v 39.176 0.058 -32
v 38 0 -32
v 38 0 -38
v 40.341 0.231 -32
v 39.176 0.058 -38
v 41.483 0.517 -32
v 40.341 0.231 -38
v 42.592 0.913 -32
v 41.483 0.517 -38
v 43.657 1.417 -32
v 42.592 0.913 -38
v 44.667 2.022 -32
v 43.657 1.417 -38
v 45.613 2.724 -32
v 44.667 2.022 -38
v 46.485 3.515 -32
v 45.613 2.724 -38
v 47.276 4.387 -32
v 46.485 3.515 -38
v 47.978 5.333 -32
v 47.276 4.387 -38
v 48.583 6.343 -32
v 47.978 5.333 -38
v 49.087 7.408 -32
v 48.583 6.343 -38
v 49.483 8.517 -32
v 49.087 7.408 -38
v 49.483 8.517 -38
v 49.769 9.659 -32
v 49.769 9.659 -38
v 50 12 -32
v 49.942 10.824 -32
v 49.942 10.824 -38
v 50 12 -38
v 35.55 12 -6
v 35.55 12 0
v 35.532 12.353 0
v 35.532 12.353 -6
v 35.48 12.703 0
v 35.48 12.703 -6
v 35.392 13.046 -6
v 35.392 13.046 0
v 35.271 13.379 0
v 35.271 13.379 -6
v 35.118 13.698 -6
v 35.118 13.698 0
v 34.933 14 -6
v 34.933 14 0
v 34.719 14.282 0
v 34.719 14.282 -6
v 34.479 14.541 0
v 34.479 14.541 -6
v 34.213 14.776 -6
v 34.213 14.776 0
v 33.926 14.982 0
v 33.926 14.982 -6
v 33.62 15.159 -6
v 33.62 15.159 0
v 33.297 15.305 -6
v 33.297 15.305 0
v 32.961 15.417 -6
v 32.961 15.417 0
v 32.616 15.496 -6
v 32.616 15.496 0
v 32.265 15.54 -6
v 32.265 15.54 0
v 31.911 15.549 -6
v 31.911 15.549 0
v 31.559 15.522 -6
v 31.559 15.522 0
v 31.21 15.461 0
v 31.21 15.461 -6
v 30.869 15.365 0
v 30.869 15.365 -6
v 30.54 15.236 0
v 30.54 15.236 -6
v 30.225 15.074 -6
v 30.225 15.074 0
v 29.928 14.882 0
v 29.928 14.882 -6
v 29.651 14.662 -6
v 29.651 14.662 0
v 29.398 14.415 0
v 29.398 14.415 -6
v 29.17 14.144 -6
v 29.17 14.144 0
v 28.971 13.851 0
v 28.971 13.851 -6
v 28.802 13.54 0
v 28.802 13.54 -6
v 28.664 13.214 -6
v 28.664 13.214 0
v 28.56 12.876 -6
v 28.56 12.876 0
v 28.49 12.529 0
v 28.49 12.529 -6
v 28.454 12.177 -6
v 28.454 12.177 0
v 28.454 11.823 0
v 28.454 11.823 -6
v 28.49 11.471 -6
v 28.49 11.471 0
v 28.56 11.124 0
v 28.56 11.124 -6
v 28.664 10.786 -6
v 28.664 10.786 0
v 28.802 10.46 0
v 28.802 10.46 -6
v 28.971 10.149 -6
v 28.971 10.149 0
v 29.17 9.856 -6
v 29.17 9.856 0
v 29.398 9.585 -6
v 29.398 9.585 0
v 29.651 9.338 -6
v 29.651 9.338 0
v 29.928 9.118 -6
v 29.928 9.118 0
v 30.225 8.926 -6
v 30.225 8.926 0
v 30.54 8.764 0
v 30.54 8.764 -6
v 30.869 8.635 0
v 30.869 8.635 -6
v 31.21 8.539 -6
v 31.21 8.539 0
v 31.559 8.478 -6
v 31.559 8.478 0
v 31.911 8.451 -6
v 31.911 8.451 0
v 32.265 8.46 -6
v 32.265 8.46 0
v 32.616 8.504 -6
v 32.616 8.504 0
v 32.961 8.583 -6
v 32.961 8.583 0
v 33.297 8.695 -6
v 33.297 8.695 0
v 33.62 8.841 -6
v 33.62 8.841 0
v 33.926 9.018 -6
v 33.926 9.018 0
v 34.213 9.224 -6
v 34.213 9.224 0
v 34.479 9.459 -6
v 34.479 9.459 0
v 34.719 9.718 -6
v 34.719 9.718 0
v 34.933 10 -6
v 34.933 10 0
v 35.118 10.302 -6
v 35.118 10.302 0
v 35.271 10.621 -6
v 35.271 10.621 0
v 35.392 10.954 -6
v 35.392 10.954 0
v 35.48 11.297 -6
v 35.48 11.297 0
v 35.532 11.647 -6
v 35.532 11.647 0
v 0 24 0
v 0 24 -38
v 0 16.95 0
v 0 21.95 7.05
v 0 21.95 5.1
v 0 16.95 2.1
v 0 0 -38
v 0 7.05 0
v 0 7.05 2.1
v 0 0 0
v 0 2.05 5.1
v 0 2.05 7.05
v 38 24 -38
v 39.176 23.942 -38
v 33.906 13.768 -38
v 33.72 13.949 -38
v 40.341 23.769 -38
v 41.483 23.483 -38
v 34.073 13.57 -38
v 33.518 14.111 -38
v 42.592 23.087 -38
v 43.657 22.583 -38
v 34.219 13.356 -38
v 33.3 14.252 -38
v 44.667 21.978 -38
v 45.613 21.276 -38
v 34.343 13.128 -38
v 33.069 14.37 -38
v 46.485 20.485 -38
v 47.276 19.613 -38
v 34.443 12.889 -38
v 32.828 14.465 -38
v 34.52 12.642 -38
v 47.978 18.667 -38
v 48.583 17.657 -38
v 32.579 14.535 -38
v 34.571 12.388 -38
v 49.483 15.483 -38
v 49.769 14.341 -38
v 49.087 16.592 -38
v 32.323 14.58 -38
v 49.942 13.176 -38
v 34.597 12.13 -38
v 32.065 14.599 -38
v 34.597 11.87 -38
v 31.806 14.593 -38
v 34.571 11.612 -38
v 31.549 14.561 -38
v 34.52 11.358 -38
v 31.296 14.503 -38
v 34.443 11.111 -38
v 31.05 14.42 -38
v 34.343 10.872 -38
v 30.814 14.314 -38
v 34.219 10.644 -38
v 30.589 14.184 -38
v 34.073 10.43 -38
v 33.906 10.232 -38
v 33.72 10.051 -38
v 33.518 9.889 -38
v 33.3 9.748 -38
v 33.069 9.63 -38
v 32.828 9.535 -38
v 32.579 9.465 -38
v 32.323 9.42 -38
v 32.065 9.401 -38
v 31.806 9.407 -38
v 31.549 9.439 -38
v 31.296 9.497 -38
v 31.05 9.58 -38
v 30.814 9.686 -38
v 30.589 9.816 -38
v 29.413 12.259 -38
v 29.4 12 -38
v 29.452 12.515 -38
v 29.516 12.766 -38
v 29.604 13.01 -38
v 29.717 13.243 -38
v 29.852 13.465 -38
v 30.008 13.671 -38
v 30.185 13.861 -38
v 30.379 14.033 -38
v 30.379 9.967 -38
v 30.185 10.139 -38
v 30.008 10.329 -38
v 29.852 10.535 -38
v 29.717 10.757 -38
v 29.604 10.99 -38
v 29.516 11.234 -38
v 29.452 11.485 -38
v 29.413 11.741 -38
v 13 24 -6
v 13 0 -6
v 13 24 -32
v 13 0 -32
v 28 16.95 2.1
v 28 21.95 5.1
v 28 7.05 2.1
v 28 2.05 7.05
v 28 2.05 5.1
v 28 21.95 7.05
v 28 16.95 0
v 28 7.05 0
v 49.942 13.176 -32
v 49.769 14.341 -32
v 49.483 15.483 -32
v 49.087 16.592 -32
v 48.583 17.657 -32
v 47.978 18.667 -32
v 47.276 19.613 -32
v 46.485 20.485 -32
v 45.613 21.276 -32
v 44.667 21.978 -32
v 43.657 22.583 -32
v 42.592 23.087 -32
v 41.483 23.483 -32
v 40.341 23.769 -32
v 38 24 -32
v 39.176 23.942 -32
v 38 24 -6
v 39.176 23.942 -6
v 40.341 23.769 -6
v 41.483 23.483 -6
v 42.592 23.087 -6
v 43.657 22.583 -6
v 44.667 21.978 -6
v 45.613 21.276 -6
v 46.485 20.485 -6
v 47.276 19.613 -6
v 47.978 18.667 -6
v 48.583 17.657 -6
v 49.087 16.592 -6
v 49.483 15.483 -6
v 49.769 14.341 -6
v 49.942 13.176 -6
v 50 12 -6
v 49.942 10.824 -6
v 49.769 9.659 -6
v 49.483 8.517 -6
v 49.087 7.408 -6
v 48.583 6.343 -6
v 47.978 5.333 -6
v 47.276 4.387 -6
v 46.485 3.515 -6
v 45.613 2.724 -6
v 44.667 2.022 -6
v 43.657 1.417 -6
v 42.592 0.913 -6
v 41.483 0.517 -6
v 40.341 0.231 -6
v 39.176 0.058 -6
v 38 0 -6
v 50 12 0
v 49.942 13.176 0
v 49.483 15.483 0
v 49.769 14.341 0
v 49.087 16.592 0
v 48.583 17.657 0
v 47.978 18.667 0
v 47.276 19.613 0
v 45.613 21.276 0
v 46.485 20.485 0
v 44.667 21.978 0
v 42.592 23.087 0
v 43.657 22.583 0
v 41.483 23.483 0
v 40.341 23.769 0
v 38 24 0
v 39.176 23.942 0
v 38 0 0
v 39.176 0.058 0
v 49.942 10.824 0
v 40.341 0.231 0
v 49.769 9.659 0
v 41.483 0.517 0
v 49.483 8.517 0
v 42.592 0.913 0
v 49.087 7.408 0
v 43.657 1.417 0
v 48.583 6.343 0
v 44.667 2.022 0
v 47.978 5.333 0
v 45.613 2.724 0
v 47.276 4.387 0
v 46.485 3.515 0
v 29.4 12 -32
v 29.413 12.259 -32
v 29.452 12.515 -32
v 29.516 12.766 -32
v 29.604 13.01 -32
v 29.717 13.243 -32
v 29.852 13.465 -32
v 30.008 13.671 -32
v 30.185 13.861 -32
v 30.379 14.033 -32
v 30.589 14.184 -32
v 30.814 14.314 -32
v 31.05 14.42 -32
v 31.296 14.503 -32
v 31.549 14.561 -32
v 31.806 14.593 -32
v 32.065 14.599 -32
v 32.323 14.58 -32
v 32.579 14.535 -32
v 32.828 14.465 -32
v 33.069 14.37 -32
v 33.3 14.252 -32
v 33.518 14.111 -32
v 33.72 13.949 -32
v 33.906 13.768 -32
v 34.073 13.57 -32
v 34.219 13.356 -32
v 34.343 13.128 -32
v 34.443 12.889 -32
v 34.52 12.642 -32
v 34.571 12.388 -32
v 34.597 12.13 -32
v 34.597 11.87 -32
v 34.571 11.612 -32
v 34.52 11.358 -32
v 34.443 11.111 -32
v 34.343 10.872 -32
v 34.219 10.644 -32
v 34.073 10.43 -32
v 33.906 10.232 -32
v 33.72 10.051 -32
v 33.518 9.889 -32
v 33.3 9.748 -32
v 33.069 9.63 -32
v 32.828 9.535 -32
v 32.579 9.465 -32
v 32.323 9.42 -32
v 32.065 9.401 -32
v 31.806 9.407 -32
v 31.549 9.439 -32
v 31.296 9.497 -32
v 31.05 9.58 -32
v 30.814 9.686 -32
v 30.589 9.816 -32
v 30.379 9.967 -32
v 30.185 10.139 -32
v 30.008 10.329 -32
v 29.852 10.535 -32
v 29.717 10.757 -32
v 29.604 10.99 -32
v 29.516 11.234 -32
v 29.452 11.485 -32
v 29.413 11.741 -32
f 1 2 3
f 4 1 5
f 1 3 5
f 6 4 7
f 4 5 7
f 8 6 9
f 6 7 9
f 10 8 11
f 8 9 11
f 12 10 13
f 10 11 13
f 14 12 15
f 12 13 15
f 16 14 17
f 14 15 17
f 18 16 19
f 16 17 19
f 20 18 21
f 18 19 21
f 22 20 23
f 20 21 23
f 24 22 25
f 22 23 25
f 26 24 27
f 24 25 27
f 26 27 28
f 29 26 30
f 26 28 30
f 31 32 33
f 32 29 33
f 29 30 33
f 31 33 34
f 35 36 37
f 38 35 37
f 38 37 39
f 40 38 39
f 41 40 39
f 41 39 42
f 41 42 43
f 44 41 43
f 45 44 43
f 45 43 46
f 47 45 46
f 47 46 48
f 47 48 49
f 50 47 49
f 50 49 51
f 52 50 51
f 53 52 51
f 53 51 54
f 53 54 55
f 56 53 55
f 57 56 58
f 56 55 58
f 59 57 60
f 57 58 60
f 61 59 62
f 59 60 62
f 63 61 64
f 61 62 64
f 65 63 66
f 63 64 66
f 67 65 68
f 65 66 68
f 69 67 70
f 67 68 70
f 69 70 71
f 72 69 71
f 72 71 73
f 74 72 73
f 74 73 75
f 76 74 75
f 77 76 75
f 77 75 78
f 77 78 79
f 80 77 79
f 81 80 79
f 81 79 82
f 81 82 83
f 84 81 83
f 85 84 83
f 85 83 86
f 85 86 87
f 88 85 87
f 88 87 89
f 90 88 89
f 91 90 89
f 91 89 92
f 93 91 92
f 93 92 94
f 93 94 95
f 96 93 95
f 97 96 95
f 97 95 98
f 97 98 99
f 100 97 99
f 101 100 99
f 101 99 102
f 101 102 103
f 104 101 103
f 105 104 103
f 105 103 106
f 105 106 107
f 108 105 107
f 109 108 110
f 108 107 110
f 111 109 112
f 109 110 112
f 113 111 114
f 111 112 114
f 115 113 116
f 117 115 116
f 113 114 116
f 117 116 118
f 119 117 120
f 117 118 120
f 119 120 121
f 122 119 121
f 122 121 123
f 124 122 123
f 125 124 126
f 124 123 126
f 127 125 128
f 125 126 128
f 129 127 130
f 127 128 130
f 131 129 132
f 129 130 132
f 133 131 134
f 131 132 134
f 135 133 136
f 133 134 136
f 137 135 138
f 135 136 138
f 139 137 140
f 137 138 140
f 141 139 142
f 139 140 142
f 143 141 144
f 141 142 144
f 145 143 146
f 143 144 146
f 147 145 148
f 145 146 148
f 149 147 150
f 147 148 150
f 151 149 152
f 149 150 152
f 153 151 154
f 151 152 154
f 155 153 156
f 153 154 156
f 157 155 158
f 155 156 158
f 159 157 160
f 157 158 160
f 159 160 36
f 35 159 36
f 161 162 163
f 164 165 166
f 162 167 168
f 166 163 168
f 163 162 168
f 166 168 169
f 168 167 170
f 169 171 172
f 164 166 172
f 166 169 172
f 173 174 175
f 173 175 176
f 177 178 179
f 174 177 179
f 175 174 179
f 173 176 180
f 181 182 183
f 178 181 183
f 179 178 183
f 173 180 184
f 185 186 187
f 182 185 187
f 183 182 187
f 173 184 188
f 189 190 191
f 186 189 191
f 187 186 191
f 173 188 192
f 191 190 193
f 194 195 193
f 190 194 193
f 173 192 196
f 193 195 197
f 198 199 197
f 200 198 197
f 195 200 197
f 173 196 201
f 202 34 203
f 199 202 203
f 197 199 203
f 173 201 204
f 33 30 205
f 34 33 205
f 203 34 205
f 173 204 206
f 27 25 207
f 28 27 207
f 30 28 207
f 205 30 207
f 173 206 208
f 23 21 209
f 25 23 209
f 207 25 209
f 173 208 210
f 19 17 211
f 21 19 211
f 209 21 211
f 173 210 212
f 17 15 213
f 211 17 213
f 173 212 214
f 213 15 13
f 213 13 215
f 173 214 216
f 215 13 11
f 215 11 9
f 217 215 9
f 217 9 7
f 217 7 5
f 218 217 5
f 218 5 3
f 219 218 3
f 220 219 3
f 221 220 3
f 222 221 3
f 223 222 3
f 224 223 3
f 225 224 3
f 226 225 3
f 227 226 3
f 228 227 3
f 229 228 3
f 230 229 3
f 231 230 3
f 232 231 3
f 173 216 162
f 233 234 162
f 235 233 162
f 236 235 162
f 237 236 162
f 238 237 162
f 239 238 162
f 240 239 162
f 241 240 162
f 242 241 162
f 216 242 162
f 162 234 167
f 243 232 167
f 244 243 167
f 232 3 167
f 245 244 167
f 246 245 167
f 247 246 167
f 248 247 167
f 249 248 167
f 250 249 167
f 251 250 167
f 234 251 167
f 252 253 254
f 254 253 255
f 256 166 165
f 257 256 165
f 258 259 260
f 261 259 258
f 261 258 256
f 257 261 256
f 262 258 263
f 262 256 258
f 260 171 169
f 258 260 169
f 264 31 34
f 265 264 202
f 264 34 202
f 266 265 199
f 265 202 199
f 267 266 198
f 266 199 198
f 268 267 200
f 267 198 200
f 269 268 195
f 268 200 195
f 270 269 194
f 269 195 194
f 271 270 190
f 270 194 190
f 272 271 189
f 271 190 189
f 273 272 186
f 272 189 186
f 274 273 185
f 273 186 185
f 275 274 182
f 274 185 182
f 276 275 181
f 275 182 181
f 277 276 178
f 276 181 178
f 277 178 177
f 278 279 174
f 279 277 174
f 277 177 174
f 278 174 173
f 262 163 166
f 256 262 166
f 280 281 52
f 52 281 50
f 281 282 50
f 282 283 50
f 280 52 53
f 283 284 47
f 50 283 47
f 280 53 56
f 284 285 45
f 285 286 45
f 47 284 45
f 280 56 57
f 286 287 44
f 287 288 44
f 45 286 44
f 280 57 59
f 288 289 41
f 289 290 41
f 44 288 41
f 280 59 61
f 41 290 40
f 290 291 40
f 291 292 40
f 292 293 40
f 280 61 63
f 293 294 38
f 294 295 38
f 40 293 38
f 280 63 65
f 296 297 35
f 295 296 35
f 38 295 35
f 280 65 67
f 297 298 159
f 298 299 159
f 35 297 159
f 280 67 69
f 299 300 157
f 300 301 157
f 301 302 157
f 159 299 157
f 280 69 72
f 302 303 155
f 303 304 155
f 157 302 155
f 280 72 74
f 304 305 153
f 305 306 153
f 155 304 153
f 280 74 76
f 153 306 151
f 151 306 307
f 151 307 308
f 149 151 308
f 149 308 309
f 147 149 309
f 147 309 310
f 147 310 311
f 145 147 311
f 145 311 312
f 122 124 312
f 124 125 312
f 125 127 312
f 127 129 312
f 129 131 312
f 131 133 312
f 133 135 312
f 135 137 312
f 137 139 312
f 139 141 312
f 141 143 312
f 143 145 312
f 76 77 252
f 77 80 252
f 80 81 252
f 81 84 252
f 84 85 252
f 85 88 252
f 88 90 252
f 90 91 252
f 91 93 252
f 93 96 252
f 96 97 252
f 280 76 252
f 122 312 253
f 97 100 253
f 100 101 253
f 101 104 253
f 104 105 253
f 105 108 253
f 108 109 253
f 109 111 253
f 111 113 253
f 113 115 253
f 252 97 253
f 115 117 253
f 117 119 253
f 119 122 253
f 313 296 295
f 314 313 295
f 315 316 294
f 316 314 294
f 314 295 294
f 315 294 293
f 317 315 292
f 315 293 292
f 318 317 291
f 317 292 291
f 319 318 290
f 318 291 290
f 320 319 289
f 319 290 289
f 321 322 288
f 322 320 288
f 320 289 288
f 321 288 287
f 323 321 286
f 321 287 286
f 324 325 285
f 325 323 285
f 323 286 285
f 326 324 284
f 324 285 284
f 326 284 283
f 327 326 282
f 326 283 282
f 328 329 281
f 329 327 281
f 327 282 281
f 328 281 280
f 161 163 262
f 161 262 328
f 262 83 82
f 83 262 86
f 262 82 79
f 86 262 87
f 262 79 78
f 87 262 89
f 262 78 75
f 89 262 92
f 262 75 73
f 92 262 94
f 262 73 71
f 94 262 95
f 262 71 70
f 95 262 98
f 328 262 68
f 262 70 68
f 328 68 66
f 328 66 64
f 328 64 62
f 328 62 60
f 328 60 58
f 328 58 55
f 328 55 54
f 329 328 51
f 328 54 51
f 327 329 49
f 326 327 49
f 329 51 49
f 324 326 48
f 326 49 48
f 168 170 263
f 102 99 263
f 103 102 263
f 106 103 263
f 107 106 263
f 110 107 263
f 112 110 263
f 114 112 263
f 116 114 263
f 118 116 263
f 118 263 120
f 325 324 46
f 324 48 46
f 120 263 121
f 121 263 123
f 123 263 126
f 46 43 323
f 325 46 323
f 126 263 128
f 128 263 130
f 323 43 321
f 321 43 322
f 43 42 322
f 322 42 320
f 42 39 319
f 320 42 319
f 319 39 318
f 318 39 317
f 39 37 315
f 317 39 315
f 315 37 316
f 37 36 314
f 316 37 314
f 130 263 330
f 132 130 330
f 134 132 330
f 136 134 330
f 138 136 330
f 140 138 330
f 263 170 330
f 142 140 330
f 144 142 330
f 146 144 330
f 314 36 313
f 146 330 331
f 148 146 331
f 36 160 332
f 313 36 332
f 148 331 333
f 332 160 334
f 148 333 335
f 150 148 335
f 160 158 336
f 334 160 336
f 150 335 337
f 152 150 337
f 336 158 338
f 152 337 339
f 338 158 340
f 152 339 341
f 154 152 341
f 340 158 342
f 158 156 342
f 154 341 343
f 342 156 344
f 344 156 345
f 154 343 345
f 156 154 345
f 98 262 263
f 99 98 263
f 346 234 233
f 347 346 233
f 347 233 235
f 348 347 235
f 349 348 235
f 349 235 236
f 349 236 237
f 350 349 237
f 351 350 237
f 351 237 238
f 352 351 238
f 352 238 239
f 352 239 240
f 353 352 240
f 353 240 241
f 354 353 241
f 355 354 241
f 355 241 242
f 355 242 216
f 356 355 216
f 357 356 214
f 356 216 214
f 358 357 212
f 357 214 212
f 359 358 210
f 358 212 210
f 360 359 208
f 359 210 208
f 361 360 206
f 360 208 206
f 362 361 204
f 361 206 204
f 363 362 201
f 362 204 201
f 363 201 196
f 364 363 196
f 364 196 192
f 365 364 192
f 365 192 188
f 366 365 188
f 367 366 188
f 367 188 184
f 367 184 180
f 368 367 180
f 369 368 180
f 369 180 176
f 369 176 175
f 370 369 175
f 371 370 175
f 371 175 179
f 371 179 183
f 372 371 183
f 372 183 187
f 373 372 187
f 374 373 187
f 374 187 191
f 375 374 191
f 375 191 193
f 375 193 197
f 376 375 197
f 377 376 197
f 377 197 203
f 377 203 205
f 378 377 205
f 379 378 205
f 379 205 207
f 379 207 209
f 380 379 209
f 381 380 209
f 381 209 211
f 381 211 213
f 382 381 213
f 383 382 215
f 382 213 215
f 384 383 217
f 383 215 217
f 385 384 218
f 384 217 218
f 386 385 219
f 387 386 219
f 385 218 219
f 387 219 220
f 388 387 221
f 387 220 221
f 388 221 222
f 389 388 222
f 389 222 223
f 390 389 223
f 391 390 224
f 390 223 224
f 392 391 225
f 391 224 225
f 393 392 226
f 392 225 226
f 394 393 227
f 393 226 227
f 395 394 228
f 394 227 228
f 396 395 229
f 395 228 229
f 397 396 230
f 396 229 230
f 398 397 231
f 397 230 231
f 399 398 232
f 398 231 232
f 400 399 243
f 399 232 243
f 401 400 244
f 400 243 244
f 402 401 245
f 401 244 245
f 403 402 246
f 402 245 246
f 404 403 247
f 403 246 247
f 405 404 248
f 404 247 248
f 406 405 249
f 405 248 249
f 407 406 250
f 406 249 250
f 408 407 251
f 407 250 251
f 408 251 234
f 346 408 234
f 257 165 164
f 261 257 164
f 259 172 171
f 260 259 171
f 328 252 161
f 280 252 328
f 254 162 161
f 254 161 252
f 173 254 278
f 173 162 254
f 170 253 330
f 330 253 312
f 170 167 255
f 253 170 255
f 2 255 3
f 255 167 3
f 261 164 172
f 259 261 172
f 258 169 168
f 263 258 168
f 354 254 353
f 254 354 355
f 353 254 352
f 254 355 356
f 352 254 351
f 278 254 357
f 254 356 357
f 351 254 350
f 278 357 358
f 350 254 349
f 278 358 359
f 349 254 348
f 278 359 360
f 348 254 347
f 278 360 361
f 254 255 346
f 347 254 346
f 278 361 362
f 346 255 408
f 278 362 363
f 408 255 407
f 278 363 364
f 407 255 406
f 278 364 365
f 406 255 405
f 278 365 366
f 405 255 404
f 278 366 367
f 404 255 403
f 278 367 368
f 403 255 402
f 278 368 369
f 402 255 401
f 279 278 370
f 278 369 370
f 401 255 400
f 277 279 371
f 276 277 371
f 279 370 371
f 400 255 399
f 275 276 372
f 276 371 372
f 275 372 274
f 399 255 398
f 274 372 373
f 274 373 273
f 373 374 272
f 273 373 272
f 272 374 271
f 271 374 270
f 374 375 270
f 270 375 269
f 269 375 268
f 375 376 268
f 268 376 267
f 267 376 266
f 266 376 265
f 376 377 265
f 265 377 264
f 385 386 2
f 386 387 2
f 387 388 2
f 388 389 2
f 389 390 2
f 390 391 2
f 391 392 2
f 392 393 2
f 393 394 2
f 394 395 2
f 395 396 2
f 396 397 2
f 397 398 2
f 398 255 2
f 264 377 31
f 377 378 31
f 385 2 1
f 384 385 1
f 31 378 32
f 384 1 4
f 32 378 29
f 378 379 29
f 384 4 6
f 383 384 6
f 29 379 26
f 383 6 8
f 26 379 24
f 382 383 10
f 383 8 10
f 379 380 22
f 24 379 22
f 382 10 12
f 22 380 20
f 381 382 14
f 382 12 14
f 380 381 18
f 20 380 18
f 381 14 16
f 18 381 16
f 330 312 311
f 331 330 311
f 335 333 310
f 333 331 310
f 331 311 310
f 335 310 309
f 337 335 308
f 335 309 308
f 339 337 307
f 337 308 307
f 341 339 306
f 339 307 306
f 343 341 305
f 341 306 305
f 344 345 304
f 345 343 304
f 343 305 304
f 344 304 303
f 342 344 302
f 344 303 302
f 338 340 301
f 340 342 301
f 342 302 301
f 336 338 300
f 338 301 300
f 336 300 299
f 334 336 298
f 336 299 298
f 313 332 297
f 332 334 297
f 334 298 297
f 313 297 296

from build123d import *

# Parameters (mm, degrees)
BOSS_EXTRUDE1_DEPTH = 24
SKETCH3_R           = 2.6
CUT_EXTRUDE1_DEPTH  = 60
SKETCH5_R           = 3.55
CUT_EXTRUDE2_DEPTH  = 10
BOSS_EXTRUDE2_DEPTH = 28


with BuildPart() as part:
    # Sketch1 → Boss-Extrude1 (new body)
    with BuildSketch(Plane(origin=(0, 0, 0), x_dir=(1, 0, 0), z_dir=(0, 1, 0))):
        Polygon((0, 0), (50, 0), (50, 6), (13, 6), (13, 32), (50, 32), (50, 38), (0, 38), align=None)
    extrude(amount=BOSS_EXTRUDE1_DEPTH)

    # Sketch3 → Cut-Extrude1 (cut)
    with BuildSketch(Plane(origin=(0, 0, -38), x_dir=(-1, 0, 0), z_dir=(0, 0, -1))):
        with BuildLine():
            Line((-38, 24), (-50, 24))
            Line((-50, 24), (-50, 12))
            ThreePointArc((-50, 12), (-46.485281374, 20.485281374), (-38, 24))
        make_face()
        with BuildLine():
            ThreePointArc((-38, 0), (-46.485281374, 3.514718626), (-50, 12))
            Line((-50, 12), (-50, 0))
            Line((-50, 0), (-38, 0))
        make_face()
        with Locations((-32, 12)):
            Circle(SKETCH3_R)
    extrude(amount=-CUT_EXTRUDE1_DEPTH, mode=Mode.SUBTRACT)

    # Sketch5 → Cut-Extrude2 (cut)
    with BuildSketch(Plane.XY):
        with Locations((32, 12)):
            Circle(SKETCH5_R)
    extrude(amount=-CUT_EXTRUDE2_DEPTH, mode=Mode.SUBTRACT)

    # Sketch7 → Boss-Extrude2 (add)
    with BuildSketch(Plane.ZY):
        Polygon((0, 16.95), (2.1, 16.95), (5.1, 21.95), (7.05, 21.95), (7.05, 2.05), (5.1, 2.05), (2.1, 7.05), (0, 7.05), align=None)
    extrude(amount=-BOSS_EXTRUDE2_DEPTH)


solid = part.part
